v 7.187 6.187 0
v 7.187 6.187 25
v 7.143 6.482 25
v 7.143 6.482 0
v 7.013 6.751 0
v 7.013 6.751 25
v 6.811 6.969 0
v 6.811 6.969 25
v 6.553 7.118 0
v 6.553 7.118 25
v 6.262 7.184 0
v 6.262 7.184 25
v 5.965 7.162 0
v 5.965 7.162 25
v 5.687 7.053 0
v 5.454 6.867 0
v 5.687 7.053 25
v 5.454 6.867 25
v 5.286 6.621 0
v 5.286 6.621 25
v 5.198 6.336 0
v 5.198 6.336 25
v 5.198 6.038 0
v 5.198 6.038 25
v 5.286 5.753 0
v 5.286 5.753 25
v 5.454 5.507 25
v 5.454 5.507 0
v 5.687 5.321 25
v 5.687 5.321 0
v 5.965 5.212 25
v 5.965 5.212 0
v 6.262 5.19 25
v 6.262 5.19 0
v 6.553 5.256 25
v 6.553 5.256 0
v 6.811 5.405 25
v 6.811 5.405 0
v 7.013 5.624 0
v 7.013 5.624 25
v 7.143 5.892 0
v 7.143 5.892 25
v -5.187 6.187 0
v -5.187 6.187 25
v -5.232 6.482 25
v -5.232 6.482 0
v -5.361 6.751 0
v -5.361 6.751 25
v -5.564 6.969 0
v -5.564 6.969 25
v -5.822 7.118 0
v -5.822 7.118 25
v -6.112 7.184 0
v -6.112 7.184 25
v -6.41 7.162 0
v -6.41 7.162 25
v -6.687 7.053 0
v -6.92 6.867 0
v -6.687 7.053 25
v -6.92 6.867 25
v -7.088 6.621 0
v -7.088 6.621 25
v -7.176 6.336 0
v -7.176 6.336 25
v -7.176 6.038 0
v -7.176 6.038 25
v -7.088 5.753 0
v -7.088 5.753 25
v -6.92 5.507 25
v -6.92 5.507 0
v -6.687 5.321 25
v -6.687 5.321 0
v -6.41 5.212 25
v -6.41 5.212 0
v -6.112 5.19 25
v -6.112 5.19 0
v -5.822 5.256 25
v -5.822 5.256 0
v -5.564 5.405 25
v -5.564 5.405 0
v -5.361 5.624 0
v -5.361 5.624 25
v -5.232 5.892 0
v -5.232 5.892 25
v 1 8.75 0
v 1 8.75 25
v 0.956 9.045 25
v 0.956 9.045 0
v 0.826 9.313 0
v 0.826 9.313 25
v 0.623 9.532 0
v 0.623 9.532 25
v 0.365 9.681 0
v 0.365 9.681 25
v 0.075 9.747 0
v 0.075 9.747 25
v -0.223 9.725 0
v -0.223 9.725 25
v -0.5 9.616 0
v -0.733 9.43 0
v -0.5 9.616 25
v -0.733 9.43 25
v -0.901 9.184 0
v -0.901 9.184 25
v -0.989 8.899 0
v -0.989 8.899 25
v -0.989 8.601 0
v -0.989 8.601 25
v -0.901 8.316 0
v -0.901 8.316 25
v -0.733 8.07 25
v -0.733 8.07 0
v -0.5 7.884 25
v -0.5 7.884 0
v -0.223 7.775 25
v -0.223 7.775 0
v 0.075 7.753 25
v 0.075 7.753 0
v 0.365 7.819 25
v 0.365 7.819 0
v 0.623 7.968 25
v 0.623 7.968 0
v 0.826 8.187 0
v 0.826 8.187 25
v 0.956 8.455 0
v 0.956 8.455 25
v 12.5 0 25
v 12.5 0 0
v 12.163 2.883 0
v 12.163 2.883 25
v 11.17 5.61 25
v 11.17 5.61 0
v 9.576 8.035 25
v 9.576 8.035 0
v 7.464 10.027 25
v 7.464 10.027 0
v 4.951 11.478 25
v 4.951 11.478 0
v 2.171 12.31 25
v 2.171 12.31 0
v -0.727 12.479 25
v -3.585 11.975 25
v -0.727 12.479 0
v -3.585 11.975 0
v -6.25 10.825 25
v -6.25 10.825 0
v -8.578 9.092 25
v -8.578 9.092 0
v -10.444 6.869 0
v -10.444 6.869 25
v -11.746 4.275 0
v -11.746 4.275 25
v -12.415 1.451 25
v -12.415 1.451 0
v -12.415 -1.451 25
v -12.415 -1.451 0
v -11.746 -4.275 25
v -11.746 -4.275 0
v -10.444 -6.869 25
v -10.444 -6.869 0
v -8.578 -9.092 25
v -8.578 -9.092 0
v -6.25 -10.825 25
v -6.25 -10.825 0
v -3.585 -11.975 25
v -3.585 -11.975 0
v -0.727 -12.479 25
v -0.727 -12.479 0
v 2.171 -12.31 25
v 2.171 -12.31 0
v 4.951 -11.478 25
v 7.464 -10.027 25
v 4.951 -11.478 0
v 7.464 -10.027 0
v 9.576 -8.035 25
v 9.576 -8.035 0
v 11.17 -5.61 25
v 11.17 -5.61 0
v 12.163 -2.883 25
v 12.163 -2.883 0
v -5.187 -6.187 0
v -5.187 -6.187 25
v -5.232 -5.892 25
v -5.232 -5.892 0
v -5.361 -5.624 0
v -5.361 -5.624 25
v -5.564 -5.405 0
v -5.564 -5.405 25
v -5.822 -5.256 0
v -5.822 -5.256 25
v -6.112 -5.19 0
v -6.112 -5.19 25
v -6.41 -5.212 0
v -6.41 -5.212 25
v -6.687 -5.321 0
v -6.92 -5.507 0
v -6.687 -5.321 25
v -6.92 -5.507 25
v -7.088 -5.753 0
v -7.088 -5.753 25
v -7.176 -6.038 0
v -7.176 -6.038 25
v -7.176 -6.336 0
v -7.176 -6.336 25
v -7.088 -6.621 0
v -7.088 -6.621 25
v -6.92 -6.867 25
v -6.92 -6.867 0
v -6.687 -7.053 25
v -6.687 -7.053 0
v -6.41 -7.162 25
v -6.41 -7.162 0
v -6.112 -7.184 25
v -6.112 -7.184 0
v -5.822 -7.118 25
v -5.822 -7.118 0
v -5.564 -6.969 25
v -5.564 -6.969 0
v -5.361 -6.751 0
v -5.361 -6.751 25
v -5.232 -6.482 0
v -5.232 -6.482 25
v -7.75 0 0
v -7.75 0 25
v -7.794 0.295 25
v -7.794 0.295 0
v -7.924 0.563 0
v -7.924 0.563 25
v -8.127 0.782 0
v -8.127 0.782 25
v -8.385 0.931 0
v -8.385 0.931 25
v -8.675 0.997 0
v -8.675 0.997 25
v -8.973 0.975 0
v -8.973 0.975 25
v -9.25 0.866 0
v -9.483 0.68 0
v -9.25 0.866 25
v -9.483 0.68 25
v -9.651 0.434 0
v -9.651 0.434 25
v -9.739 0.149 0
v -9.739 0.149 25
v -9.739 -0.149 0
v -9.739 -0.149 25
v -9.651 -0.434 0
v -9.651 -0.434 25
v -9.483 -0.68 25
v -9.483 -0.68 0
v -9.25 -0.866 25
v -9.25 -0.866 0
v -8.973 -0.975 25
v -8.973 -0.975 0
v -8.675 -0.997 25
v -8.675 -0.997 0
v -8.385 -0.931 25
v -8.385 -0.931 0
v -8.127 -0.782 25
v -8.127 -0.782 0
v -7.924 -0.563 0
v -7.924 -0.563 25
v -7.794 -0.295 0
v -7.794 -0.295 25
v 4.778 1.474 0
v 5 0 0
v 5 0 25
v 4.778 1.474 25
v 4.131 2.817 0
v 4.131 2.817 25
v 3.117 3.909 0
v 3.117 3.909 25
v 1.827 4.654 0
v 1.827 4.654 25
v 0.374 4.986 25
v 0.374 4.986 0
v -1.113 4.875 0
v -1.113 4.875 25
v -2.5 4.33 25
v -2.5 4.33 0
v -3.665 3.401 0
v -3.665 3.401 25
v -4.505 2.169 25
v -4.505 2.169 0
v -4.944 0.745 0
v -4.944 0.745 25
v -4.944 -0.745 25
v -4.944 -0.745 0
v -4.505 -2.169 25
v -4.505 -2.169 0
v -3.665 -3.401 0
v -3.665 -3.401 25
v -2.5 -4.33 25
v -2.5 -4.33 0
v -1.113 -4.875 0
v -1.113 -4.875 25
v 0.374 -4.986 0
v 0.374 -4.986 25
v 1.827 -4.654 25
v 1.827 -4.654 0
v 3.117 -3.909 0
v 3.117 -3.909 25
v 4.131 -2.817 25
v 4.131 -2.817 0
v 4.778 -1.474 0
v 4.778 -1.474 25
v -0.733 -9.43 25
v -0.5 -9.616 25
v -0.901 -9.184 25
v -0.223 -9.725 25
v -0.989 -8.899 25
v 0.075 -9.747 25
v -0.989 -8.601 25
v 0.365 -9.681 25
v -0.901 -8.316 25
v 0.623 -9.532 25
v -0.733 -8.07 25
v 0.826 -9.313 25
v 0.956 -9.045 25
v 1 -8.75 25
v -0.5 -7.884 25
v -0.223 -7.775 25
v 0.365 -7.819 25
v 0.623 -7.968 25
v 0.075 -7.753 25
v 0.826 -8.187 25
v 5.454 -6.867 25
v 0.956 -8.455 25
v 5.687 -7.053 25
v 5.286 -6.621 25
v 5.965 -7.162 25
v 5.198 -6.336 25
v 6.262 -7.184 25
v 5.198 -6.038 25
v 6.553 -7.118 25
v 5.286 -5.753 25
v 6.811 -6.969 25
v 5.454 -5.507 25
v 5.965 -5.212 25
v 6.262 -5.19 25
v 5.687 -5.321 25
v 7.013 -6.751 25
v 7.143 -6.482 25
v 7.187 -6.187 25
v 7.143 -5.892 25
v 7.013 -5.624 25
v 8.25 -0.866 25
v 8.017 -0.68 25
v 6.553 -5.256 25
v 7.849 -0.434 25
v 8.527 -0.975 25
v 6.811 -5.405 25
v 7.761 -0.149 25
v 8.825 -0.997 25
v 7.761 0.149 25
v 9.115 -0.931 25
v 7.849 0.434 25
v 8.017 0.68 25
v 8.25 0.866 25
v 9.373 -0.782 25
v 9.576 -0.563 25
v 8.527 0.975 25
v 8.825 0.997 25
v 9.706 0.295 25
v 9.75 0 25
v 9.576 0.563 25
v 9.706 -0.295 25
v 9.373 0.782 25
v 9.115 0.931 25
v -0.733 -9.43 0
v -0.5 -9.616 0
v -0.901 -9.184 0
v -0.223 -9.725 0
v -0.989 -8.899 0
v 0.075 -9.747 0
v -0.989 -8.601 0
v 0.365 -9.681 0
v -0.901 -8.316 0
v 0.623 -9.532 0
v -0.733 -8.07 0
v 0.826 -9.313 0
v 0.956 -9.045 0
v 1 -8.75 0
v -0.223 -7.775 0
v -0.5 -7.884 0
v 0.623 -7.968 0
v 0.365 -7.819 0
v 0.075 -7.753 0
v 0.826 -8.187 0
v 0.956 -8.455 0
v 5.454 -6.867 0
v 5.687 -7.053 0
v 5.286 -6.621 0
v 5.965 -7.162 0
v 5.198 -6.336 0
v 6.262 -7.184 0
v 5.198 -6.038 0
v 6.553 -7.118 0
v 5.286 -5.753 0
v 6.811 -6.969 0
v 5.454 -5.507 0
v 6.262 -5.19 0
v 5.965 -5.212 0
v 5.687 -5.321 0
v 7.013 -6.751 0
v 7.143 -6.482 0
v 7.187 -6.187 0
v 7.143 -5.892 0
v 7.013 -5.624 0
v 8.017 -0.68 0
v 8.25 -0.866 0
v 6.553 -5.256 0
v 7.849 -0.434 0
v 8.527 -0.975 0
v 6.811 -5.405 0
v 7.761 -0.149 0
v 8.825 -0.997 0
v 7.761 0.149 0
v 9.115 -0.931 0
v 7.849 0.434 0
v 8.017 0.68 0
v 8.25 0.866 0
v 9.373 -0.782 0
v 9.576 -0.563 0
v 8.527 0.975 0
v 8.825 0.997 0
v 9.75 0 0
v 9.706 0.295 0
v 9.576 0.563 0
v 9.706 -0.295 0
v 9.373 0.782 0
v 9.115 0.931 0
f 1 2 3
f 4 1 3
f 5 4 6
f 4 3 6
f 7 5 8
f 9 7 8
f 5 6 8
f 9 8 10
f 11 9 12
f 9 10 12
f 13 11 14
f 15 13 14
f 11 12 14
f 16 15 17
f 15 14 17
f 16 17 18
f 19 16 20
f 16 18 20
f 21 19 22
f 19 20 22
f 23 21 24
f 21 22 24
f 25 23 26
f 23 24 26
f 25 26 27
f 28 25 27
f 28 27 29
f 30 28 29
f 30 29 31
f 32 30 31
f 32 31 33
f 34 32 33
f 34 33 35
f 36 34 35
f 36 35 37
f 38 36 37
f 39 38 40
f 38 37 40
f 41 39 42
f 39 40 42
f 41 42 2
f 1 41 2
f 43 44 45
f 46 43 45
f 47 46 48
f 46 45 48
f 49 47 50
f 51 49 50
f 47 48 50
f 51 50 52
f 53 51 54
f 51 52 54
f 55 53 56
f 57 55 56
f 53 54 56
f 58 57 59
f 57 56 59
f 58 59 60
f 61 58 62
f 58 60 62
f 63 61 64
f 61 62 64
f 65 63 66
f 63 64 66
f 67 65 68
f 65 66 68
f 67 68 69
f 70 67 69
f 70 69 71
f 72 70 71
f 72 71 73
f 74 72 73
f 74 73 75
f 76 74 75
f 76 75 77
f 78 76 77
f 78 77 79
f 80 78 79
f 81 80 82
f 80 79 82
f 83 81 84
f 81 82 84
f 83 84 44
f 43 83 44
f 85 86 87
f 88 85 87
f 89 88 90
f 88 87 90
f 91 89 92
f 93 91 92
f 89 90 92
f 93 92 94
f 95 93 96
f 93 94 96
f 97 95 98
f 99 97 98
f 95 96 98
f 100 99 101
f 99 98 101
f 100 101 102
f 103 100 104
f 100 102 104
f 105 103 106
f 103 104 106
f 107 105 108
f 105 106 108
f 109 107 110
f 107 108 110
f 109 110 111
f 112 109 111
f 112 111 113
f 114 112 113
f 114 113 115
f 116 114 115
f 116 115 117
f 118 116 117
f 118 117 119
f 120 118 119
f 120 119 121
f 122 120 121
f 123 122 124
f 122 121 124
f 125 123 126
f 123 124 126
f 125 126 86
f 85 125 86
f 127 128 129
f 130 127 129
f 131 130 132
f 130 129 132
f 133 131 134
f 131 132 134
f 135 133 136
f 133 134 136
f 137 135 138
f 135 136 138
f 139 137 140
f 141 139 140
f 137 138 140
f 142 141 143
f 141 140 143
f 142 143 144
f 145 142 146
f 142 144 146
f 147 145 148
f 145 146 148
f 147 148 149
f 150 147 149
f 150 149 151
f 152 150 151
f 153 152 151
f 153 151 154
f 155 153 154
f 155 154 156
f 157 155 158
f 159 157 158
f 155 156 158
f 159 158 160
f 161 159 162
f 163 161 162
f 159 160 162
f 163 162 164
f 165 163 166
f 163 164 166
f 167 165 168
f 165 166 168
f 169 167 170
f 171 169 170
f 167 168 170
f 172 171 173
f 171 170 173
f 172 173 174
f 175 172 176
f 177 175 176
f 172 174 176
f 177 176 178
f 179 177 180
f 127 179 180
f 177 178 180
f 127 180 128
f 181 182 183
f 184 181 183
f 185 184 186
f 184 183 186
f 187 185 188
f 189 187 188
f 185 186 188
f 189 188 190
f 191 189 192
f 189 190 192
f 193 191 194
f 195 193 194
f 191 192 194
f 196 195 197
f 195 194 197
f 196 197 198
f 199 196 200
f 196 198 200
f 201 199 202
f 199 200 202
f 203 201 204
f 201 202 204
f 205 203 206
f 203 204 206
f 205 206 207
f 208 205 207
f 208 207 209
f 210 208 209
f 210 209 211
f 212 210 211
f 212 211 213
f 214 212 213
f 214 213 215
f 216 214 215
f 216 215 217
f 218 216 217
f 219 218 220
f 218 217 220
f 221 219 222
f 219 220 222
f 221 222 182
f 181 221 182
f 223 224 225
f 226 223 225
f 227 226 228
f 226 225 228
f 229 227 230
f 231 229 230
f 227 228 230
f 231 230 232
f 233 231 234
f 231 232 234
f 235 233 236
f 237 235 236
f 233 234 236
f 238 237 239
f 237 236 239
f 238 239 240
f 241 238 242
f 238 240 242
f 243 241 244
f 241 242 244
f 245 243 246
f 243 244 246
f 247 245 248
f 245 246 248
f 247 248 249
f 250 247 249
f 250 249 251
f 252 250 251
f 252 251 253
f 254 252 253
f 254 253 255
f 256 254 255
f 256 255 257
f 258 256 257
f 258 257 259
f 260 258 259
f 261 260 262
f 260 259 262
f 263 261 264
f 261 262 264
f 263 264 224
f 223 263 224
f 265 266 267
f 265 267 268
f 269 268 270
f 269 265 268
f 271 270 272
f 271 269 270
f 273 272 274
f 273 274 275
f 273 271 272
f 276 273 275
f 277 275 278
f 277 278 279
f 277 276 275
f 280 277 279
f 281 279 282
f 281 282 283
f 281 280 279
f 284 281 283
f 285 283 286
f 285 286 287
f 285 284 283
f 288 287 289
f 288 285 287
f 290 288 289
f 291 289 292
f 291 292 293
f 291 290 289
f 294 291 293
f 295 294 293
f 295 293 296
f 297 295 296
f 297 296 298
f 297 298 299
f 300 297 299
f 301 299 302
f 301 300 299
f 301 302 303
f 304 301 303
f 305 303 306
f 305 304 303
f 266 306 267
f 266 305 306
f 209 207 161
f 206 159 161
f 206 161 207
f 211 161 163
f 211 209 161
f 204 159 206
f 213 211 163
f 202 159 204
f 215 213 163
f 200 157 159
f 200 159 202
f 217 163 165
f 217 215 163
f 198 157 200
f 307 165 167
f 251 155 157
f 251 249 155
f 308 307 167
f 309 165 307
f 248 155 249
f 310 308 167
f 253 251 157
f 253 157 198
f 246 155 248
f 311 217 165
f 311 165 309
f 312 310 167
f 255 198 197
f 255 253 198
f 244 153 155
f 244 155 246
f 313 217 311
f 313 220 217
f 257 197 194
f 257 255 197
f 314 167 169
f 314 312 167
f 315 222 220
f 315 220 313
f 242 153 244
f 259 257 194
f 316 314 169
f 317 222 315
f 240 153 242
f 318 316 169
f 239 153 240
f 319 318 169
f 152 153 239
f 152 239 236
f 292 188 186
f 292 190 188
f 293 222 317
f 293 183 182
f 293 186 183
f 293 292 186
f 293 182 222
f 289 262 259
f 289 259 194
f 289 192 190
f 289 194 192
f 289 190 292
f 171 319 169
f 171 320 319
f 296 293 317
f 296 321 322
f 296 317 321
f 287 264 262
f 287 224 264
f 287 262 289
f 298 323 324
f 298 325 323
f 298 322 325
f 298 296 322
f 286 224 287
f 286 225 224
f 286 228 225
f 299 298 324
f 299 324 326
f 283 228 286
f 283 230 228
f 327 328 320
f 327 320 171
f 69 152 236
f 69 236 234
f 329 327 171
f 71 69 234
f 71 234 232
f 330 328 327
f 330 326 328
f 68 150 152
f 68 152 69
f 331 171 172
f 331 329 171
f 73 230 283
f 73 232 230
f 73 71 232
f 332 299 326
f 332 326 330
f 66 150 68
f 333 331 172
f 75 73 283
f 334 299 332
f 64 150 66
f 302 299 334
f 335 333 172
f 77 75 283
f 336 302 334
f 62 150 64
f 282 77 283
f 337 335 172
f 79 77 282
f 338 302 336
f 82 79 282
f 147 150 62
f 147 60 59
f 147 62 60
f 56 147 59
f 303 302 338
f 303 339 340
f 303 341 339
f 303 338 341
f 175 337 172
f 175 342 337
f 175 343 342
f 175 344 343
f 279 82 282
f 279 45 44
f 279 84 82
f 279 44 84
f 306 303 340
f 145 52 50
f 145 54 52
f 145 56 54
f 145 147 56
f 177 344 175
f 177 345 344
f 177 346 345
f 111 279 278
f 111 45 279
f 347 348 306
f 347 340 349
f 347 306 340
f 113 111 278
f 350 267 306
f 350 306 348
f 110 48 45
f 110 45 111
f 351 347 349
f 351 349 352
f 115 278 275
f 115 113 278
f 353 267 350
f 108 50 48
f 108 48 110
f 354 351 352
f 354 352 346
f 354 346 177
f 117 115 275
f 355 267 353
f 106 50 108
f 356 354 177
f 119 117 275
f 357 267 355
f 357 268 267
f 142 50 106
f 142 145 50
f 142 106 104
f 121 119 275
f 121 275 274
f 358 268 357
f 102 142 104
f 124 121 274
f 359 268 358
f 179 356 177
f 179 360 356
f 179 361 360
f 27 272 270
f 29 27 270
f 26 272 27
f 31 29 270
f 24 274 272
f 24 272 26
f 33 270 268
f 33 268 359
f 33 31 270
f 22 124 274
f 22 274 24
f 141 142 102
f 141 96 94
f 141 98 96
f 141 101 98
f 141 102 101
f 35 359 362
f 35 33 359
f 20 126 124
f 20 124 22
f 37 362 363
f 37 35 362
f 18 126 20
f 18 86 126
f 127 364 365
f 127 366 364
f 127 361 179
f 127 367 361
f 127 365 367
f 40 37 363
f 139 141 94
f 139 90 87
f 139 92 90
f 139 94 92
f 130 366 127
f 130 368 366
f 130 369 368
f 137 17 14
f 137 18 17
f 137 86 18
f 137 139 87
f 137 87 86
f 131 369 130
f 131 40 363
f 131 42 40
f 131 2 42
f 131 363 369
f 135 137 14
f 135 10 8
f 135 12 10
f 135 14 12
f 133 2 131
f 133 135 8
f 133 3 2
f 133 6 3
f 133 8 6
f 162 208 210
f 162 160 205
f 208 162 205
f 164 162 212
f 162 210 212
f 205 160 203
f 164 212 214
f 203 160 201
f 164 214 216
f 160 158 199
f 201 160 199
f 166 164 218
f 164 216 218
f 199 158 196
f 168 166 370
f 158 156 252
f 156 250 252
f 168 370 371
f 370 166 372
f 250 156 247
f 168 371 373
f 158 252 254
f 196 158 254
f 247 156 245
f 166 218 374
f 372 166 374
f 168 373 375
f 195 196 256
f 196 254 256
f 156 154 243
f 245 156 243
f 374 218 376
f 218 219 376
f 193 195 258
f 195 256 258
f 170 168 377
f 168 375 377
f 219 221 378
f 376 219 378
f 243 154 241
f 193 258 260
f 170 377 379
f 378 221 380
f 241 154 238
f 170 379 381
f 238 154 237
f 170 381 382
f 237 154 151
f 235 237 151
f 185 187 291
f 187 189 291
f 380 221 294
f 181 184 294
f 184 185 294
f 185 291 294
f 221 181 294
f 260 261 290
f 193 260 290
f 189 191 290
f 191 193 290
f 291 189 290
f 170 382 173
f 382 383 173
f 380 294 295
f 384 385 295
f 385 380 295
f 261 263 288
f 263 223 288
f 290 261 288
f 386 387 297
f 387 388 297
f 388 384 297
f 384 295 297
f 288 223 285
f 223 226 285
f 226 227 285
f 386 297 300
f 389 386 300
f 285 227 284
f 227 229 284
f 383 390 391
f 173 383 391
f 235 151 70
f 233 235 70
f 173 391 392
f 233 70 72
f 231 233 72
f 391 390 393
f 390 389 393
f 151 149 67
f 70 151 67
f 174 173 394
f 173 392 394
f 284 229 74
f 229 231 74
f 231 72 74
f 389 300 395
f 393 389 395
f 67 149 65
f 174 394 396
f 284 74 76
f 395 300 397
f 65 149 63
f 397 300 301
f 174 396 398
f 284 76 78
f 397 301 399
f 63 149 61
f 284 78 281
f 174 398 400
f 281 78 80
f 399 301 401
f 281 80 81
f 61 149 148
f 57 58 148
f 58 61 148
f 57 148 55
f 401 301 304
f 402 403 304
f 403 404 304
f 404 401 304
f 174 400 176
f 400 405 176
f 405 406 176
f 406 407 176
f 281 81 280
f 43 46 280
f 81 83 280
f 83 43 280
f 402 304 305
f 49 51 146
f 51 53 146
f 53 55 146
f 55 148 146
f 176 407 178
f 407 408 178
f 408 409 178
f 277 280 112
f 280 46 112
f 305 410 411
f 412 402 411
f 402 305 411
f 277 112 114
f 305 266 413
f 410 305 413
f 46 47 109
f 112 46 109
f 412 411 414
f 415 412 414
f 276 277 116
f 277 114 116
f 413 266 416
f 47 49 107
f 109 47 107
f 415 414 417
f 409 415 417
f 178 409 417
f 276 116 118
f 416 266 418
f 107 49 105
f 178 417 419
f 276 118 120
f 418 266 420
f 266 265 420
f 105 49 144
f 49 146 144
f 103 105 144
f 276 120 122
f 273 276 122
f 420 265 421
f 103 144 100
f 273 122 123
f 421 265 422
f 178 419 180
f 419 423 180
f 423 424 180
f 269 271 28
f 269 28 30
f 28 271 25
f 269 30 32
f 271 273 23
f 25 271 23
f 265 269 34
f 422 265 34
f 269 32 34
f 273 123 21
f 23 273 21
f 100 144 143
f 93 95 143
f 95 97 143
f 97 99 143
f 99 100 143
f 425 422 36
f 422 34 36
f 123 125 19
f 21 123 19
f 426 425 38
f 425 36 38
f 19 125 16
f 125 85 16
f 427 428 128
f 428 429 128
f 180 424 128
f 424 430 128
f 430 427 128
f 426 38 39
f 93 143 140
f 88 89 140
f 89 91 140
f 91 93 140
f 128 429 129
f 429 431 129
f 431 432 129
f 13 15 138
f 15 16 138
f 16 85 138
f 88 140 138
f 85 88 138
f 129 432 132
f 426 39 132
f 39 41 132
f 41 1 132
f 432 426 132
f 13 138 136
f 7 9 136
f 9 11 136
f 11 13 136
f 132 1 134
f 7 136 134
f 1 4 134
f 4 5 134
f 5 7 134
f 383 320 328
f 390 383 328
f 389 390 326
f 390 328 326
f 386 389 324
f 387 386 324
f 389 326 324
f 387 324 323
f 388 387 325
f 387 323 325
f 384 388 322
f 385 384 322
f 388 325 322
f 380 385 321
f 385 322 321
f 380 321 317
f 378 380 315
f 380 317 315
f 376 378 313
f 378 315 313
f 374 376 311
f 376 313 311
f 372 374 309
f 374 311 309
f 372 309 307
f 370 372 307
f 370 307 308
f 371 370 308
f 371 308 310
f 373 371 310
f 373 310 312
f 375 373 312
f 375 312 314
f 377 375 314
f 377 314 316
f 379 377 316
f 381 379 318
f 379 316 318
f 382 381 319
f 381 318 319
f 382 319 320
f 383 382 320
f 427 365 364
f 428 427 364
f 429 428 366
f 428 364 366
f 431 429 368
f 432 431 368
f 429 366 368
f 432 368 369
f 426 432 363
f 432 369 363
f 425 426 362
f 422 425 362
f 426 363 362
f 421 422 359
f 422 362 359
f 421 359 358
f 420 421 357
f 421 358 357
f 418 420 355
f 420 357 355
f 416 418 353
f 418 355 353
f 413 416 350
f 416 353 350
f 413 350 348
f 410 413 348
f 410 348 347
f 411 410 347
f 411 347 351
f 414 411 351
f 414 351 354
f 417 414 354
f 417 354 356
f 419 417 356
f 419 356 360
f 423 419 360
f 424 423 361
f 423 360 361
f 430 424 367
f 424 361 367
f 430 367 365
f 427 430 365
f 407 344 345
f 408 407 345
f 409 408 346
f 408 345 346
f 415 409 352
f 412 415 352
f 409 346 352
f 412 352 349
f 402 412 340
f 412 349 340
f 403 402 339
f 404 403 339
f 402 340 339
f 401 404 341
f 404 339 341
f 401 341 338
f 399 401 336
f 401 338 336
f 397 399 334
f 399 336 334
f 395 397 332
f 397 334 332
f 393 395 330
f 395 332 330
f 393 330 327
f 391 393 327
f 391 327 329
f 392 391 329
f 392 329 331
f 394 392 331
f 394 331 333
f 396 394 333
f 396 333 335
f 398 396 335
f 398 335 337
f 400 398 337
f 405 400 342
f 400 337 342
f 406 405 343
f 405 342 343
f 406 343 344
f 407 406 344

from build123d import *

# Parameters (mm, degrees)
SKIZZE1_R                       = 12.5
SKIZZE1_R_2                     = 5
AUFSATZ_LINEAR_AUSTRAGEN1_DEPTH = 25
SKIZZE2_R                       = 1
SCHNITT_LINEAR_AUSTRAGEN1_DEPTH = 25


with BuildPart() as part:
    # Skizze1 → Aufsatz-Linear austragen1 (new body)
    with BuildSketch(Plane.XY):
        Circle(SKIZZE1_R)
        Circle(SKIZZE1_R_2, mode=Mode.SUBTRACT)
    extrude(amount=AUFSATZ_LINEAR_AUSTRAGEN1_DEPTH)

    # Skizze2 → Schnitt-Linear austragen1 (cut)
    with BuildSketch(Plane.XY.offset(25)):
        with Locations((0, 8.75)):
            Circle(SKIZZE2_R)
        with Locations((6.187184335, 6.187184335)):
            Circle(SKIZZE2_R)
        with Locations((8.75, 0)):
            Circle(SKIZZE2_R)
        with Locations((6.187184335, -6.187184335)):
            Circle(SKIZZE2_R)
        with Locations((0, -8.75)):
            Circle(SKIZZE2_R)
        with Locations((-6.187184335, -6.187184335)):
            Circle(SKIZZE2_R)
        with Locations((-8.75, 0)):
            Circle(SKIZZE2_R)
        with Locations((-6.187184335, 6.187184335)):
            Circle(SKIZZE2_R)
    extrude(amount=-SCHNITT_LINEAR_AUSTRAGEN1_DEPTH, mode=Mode.SUBTRACT)


solid = part.part
